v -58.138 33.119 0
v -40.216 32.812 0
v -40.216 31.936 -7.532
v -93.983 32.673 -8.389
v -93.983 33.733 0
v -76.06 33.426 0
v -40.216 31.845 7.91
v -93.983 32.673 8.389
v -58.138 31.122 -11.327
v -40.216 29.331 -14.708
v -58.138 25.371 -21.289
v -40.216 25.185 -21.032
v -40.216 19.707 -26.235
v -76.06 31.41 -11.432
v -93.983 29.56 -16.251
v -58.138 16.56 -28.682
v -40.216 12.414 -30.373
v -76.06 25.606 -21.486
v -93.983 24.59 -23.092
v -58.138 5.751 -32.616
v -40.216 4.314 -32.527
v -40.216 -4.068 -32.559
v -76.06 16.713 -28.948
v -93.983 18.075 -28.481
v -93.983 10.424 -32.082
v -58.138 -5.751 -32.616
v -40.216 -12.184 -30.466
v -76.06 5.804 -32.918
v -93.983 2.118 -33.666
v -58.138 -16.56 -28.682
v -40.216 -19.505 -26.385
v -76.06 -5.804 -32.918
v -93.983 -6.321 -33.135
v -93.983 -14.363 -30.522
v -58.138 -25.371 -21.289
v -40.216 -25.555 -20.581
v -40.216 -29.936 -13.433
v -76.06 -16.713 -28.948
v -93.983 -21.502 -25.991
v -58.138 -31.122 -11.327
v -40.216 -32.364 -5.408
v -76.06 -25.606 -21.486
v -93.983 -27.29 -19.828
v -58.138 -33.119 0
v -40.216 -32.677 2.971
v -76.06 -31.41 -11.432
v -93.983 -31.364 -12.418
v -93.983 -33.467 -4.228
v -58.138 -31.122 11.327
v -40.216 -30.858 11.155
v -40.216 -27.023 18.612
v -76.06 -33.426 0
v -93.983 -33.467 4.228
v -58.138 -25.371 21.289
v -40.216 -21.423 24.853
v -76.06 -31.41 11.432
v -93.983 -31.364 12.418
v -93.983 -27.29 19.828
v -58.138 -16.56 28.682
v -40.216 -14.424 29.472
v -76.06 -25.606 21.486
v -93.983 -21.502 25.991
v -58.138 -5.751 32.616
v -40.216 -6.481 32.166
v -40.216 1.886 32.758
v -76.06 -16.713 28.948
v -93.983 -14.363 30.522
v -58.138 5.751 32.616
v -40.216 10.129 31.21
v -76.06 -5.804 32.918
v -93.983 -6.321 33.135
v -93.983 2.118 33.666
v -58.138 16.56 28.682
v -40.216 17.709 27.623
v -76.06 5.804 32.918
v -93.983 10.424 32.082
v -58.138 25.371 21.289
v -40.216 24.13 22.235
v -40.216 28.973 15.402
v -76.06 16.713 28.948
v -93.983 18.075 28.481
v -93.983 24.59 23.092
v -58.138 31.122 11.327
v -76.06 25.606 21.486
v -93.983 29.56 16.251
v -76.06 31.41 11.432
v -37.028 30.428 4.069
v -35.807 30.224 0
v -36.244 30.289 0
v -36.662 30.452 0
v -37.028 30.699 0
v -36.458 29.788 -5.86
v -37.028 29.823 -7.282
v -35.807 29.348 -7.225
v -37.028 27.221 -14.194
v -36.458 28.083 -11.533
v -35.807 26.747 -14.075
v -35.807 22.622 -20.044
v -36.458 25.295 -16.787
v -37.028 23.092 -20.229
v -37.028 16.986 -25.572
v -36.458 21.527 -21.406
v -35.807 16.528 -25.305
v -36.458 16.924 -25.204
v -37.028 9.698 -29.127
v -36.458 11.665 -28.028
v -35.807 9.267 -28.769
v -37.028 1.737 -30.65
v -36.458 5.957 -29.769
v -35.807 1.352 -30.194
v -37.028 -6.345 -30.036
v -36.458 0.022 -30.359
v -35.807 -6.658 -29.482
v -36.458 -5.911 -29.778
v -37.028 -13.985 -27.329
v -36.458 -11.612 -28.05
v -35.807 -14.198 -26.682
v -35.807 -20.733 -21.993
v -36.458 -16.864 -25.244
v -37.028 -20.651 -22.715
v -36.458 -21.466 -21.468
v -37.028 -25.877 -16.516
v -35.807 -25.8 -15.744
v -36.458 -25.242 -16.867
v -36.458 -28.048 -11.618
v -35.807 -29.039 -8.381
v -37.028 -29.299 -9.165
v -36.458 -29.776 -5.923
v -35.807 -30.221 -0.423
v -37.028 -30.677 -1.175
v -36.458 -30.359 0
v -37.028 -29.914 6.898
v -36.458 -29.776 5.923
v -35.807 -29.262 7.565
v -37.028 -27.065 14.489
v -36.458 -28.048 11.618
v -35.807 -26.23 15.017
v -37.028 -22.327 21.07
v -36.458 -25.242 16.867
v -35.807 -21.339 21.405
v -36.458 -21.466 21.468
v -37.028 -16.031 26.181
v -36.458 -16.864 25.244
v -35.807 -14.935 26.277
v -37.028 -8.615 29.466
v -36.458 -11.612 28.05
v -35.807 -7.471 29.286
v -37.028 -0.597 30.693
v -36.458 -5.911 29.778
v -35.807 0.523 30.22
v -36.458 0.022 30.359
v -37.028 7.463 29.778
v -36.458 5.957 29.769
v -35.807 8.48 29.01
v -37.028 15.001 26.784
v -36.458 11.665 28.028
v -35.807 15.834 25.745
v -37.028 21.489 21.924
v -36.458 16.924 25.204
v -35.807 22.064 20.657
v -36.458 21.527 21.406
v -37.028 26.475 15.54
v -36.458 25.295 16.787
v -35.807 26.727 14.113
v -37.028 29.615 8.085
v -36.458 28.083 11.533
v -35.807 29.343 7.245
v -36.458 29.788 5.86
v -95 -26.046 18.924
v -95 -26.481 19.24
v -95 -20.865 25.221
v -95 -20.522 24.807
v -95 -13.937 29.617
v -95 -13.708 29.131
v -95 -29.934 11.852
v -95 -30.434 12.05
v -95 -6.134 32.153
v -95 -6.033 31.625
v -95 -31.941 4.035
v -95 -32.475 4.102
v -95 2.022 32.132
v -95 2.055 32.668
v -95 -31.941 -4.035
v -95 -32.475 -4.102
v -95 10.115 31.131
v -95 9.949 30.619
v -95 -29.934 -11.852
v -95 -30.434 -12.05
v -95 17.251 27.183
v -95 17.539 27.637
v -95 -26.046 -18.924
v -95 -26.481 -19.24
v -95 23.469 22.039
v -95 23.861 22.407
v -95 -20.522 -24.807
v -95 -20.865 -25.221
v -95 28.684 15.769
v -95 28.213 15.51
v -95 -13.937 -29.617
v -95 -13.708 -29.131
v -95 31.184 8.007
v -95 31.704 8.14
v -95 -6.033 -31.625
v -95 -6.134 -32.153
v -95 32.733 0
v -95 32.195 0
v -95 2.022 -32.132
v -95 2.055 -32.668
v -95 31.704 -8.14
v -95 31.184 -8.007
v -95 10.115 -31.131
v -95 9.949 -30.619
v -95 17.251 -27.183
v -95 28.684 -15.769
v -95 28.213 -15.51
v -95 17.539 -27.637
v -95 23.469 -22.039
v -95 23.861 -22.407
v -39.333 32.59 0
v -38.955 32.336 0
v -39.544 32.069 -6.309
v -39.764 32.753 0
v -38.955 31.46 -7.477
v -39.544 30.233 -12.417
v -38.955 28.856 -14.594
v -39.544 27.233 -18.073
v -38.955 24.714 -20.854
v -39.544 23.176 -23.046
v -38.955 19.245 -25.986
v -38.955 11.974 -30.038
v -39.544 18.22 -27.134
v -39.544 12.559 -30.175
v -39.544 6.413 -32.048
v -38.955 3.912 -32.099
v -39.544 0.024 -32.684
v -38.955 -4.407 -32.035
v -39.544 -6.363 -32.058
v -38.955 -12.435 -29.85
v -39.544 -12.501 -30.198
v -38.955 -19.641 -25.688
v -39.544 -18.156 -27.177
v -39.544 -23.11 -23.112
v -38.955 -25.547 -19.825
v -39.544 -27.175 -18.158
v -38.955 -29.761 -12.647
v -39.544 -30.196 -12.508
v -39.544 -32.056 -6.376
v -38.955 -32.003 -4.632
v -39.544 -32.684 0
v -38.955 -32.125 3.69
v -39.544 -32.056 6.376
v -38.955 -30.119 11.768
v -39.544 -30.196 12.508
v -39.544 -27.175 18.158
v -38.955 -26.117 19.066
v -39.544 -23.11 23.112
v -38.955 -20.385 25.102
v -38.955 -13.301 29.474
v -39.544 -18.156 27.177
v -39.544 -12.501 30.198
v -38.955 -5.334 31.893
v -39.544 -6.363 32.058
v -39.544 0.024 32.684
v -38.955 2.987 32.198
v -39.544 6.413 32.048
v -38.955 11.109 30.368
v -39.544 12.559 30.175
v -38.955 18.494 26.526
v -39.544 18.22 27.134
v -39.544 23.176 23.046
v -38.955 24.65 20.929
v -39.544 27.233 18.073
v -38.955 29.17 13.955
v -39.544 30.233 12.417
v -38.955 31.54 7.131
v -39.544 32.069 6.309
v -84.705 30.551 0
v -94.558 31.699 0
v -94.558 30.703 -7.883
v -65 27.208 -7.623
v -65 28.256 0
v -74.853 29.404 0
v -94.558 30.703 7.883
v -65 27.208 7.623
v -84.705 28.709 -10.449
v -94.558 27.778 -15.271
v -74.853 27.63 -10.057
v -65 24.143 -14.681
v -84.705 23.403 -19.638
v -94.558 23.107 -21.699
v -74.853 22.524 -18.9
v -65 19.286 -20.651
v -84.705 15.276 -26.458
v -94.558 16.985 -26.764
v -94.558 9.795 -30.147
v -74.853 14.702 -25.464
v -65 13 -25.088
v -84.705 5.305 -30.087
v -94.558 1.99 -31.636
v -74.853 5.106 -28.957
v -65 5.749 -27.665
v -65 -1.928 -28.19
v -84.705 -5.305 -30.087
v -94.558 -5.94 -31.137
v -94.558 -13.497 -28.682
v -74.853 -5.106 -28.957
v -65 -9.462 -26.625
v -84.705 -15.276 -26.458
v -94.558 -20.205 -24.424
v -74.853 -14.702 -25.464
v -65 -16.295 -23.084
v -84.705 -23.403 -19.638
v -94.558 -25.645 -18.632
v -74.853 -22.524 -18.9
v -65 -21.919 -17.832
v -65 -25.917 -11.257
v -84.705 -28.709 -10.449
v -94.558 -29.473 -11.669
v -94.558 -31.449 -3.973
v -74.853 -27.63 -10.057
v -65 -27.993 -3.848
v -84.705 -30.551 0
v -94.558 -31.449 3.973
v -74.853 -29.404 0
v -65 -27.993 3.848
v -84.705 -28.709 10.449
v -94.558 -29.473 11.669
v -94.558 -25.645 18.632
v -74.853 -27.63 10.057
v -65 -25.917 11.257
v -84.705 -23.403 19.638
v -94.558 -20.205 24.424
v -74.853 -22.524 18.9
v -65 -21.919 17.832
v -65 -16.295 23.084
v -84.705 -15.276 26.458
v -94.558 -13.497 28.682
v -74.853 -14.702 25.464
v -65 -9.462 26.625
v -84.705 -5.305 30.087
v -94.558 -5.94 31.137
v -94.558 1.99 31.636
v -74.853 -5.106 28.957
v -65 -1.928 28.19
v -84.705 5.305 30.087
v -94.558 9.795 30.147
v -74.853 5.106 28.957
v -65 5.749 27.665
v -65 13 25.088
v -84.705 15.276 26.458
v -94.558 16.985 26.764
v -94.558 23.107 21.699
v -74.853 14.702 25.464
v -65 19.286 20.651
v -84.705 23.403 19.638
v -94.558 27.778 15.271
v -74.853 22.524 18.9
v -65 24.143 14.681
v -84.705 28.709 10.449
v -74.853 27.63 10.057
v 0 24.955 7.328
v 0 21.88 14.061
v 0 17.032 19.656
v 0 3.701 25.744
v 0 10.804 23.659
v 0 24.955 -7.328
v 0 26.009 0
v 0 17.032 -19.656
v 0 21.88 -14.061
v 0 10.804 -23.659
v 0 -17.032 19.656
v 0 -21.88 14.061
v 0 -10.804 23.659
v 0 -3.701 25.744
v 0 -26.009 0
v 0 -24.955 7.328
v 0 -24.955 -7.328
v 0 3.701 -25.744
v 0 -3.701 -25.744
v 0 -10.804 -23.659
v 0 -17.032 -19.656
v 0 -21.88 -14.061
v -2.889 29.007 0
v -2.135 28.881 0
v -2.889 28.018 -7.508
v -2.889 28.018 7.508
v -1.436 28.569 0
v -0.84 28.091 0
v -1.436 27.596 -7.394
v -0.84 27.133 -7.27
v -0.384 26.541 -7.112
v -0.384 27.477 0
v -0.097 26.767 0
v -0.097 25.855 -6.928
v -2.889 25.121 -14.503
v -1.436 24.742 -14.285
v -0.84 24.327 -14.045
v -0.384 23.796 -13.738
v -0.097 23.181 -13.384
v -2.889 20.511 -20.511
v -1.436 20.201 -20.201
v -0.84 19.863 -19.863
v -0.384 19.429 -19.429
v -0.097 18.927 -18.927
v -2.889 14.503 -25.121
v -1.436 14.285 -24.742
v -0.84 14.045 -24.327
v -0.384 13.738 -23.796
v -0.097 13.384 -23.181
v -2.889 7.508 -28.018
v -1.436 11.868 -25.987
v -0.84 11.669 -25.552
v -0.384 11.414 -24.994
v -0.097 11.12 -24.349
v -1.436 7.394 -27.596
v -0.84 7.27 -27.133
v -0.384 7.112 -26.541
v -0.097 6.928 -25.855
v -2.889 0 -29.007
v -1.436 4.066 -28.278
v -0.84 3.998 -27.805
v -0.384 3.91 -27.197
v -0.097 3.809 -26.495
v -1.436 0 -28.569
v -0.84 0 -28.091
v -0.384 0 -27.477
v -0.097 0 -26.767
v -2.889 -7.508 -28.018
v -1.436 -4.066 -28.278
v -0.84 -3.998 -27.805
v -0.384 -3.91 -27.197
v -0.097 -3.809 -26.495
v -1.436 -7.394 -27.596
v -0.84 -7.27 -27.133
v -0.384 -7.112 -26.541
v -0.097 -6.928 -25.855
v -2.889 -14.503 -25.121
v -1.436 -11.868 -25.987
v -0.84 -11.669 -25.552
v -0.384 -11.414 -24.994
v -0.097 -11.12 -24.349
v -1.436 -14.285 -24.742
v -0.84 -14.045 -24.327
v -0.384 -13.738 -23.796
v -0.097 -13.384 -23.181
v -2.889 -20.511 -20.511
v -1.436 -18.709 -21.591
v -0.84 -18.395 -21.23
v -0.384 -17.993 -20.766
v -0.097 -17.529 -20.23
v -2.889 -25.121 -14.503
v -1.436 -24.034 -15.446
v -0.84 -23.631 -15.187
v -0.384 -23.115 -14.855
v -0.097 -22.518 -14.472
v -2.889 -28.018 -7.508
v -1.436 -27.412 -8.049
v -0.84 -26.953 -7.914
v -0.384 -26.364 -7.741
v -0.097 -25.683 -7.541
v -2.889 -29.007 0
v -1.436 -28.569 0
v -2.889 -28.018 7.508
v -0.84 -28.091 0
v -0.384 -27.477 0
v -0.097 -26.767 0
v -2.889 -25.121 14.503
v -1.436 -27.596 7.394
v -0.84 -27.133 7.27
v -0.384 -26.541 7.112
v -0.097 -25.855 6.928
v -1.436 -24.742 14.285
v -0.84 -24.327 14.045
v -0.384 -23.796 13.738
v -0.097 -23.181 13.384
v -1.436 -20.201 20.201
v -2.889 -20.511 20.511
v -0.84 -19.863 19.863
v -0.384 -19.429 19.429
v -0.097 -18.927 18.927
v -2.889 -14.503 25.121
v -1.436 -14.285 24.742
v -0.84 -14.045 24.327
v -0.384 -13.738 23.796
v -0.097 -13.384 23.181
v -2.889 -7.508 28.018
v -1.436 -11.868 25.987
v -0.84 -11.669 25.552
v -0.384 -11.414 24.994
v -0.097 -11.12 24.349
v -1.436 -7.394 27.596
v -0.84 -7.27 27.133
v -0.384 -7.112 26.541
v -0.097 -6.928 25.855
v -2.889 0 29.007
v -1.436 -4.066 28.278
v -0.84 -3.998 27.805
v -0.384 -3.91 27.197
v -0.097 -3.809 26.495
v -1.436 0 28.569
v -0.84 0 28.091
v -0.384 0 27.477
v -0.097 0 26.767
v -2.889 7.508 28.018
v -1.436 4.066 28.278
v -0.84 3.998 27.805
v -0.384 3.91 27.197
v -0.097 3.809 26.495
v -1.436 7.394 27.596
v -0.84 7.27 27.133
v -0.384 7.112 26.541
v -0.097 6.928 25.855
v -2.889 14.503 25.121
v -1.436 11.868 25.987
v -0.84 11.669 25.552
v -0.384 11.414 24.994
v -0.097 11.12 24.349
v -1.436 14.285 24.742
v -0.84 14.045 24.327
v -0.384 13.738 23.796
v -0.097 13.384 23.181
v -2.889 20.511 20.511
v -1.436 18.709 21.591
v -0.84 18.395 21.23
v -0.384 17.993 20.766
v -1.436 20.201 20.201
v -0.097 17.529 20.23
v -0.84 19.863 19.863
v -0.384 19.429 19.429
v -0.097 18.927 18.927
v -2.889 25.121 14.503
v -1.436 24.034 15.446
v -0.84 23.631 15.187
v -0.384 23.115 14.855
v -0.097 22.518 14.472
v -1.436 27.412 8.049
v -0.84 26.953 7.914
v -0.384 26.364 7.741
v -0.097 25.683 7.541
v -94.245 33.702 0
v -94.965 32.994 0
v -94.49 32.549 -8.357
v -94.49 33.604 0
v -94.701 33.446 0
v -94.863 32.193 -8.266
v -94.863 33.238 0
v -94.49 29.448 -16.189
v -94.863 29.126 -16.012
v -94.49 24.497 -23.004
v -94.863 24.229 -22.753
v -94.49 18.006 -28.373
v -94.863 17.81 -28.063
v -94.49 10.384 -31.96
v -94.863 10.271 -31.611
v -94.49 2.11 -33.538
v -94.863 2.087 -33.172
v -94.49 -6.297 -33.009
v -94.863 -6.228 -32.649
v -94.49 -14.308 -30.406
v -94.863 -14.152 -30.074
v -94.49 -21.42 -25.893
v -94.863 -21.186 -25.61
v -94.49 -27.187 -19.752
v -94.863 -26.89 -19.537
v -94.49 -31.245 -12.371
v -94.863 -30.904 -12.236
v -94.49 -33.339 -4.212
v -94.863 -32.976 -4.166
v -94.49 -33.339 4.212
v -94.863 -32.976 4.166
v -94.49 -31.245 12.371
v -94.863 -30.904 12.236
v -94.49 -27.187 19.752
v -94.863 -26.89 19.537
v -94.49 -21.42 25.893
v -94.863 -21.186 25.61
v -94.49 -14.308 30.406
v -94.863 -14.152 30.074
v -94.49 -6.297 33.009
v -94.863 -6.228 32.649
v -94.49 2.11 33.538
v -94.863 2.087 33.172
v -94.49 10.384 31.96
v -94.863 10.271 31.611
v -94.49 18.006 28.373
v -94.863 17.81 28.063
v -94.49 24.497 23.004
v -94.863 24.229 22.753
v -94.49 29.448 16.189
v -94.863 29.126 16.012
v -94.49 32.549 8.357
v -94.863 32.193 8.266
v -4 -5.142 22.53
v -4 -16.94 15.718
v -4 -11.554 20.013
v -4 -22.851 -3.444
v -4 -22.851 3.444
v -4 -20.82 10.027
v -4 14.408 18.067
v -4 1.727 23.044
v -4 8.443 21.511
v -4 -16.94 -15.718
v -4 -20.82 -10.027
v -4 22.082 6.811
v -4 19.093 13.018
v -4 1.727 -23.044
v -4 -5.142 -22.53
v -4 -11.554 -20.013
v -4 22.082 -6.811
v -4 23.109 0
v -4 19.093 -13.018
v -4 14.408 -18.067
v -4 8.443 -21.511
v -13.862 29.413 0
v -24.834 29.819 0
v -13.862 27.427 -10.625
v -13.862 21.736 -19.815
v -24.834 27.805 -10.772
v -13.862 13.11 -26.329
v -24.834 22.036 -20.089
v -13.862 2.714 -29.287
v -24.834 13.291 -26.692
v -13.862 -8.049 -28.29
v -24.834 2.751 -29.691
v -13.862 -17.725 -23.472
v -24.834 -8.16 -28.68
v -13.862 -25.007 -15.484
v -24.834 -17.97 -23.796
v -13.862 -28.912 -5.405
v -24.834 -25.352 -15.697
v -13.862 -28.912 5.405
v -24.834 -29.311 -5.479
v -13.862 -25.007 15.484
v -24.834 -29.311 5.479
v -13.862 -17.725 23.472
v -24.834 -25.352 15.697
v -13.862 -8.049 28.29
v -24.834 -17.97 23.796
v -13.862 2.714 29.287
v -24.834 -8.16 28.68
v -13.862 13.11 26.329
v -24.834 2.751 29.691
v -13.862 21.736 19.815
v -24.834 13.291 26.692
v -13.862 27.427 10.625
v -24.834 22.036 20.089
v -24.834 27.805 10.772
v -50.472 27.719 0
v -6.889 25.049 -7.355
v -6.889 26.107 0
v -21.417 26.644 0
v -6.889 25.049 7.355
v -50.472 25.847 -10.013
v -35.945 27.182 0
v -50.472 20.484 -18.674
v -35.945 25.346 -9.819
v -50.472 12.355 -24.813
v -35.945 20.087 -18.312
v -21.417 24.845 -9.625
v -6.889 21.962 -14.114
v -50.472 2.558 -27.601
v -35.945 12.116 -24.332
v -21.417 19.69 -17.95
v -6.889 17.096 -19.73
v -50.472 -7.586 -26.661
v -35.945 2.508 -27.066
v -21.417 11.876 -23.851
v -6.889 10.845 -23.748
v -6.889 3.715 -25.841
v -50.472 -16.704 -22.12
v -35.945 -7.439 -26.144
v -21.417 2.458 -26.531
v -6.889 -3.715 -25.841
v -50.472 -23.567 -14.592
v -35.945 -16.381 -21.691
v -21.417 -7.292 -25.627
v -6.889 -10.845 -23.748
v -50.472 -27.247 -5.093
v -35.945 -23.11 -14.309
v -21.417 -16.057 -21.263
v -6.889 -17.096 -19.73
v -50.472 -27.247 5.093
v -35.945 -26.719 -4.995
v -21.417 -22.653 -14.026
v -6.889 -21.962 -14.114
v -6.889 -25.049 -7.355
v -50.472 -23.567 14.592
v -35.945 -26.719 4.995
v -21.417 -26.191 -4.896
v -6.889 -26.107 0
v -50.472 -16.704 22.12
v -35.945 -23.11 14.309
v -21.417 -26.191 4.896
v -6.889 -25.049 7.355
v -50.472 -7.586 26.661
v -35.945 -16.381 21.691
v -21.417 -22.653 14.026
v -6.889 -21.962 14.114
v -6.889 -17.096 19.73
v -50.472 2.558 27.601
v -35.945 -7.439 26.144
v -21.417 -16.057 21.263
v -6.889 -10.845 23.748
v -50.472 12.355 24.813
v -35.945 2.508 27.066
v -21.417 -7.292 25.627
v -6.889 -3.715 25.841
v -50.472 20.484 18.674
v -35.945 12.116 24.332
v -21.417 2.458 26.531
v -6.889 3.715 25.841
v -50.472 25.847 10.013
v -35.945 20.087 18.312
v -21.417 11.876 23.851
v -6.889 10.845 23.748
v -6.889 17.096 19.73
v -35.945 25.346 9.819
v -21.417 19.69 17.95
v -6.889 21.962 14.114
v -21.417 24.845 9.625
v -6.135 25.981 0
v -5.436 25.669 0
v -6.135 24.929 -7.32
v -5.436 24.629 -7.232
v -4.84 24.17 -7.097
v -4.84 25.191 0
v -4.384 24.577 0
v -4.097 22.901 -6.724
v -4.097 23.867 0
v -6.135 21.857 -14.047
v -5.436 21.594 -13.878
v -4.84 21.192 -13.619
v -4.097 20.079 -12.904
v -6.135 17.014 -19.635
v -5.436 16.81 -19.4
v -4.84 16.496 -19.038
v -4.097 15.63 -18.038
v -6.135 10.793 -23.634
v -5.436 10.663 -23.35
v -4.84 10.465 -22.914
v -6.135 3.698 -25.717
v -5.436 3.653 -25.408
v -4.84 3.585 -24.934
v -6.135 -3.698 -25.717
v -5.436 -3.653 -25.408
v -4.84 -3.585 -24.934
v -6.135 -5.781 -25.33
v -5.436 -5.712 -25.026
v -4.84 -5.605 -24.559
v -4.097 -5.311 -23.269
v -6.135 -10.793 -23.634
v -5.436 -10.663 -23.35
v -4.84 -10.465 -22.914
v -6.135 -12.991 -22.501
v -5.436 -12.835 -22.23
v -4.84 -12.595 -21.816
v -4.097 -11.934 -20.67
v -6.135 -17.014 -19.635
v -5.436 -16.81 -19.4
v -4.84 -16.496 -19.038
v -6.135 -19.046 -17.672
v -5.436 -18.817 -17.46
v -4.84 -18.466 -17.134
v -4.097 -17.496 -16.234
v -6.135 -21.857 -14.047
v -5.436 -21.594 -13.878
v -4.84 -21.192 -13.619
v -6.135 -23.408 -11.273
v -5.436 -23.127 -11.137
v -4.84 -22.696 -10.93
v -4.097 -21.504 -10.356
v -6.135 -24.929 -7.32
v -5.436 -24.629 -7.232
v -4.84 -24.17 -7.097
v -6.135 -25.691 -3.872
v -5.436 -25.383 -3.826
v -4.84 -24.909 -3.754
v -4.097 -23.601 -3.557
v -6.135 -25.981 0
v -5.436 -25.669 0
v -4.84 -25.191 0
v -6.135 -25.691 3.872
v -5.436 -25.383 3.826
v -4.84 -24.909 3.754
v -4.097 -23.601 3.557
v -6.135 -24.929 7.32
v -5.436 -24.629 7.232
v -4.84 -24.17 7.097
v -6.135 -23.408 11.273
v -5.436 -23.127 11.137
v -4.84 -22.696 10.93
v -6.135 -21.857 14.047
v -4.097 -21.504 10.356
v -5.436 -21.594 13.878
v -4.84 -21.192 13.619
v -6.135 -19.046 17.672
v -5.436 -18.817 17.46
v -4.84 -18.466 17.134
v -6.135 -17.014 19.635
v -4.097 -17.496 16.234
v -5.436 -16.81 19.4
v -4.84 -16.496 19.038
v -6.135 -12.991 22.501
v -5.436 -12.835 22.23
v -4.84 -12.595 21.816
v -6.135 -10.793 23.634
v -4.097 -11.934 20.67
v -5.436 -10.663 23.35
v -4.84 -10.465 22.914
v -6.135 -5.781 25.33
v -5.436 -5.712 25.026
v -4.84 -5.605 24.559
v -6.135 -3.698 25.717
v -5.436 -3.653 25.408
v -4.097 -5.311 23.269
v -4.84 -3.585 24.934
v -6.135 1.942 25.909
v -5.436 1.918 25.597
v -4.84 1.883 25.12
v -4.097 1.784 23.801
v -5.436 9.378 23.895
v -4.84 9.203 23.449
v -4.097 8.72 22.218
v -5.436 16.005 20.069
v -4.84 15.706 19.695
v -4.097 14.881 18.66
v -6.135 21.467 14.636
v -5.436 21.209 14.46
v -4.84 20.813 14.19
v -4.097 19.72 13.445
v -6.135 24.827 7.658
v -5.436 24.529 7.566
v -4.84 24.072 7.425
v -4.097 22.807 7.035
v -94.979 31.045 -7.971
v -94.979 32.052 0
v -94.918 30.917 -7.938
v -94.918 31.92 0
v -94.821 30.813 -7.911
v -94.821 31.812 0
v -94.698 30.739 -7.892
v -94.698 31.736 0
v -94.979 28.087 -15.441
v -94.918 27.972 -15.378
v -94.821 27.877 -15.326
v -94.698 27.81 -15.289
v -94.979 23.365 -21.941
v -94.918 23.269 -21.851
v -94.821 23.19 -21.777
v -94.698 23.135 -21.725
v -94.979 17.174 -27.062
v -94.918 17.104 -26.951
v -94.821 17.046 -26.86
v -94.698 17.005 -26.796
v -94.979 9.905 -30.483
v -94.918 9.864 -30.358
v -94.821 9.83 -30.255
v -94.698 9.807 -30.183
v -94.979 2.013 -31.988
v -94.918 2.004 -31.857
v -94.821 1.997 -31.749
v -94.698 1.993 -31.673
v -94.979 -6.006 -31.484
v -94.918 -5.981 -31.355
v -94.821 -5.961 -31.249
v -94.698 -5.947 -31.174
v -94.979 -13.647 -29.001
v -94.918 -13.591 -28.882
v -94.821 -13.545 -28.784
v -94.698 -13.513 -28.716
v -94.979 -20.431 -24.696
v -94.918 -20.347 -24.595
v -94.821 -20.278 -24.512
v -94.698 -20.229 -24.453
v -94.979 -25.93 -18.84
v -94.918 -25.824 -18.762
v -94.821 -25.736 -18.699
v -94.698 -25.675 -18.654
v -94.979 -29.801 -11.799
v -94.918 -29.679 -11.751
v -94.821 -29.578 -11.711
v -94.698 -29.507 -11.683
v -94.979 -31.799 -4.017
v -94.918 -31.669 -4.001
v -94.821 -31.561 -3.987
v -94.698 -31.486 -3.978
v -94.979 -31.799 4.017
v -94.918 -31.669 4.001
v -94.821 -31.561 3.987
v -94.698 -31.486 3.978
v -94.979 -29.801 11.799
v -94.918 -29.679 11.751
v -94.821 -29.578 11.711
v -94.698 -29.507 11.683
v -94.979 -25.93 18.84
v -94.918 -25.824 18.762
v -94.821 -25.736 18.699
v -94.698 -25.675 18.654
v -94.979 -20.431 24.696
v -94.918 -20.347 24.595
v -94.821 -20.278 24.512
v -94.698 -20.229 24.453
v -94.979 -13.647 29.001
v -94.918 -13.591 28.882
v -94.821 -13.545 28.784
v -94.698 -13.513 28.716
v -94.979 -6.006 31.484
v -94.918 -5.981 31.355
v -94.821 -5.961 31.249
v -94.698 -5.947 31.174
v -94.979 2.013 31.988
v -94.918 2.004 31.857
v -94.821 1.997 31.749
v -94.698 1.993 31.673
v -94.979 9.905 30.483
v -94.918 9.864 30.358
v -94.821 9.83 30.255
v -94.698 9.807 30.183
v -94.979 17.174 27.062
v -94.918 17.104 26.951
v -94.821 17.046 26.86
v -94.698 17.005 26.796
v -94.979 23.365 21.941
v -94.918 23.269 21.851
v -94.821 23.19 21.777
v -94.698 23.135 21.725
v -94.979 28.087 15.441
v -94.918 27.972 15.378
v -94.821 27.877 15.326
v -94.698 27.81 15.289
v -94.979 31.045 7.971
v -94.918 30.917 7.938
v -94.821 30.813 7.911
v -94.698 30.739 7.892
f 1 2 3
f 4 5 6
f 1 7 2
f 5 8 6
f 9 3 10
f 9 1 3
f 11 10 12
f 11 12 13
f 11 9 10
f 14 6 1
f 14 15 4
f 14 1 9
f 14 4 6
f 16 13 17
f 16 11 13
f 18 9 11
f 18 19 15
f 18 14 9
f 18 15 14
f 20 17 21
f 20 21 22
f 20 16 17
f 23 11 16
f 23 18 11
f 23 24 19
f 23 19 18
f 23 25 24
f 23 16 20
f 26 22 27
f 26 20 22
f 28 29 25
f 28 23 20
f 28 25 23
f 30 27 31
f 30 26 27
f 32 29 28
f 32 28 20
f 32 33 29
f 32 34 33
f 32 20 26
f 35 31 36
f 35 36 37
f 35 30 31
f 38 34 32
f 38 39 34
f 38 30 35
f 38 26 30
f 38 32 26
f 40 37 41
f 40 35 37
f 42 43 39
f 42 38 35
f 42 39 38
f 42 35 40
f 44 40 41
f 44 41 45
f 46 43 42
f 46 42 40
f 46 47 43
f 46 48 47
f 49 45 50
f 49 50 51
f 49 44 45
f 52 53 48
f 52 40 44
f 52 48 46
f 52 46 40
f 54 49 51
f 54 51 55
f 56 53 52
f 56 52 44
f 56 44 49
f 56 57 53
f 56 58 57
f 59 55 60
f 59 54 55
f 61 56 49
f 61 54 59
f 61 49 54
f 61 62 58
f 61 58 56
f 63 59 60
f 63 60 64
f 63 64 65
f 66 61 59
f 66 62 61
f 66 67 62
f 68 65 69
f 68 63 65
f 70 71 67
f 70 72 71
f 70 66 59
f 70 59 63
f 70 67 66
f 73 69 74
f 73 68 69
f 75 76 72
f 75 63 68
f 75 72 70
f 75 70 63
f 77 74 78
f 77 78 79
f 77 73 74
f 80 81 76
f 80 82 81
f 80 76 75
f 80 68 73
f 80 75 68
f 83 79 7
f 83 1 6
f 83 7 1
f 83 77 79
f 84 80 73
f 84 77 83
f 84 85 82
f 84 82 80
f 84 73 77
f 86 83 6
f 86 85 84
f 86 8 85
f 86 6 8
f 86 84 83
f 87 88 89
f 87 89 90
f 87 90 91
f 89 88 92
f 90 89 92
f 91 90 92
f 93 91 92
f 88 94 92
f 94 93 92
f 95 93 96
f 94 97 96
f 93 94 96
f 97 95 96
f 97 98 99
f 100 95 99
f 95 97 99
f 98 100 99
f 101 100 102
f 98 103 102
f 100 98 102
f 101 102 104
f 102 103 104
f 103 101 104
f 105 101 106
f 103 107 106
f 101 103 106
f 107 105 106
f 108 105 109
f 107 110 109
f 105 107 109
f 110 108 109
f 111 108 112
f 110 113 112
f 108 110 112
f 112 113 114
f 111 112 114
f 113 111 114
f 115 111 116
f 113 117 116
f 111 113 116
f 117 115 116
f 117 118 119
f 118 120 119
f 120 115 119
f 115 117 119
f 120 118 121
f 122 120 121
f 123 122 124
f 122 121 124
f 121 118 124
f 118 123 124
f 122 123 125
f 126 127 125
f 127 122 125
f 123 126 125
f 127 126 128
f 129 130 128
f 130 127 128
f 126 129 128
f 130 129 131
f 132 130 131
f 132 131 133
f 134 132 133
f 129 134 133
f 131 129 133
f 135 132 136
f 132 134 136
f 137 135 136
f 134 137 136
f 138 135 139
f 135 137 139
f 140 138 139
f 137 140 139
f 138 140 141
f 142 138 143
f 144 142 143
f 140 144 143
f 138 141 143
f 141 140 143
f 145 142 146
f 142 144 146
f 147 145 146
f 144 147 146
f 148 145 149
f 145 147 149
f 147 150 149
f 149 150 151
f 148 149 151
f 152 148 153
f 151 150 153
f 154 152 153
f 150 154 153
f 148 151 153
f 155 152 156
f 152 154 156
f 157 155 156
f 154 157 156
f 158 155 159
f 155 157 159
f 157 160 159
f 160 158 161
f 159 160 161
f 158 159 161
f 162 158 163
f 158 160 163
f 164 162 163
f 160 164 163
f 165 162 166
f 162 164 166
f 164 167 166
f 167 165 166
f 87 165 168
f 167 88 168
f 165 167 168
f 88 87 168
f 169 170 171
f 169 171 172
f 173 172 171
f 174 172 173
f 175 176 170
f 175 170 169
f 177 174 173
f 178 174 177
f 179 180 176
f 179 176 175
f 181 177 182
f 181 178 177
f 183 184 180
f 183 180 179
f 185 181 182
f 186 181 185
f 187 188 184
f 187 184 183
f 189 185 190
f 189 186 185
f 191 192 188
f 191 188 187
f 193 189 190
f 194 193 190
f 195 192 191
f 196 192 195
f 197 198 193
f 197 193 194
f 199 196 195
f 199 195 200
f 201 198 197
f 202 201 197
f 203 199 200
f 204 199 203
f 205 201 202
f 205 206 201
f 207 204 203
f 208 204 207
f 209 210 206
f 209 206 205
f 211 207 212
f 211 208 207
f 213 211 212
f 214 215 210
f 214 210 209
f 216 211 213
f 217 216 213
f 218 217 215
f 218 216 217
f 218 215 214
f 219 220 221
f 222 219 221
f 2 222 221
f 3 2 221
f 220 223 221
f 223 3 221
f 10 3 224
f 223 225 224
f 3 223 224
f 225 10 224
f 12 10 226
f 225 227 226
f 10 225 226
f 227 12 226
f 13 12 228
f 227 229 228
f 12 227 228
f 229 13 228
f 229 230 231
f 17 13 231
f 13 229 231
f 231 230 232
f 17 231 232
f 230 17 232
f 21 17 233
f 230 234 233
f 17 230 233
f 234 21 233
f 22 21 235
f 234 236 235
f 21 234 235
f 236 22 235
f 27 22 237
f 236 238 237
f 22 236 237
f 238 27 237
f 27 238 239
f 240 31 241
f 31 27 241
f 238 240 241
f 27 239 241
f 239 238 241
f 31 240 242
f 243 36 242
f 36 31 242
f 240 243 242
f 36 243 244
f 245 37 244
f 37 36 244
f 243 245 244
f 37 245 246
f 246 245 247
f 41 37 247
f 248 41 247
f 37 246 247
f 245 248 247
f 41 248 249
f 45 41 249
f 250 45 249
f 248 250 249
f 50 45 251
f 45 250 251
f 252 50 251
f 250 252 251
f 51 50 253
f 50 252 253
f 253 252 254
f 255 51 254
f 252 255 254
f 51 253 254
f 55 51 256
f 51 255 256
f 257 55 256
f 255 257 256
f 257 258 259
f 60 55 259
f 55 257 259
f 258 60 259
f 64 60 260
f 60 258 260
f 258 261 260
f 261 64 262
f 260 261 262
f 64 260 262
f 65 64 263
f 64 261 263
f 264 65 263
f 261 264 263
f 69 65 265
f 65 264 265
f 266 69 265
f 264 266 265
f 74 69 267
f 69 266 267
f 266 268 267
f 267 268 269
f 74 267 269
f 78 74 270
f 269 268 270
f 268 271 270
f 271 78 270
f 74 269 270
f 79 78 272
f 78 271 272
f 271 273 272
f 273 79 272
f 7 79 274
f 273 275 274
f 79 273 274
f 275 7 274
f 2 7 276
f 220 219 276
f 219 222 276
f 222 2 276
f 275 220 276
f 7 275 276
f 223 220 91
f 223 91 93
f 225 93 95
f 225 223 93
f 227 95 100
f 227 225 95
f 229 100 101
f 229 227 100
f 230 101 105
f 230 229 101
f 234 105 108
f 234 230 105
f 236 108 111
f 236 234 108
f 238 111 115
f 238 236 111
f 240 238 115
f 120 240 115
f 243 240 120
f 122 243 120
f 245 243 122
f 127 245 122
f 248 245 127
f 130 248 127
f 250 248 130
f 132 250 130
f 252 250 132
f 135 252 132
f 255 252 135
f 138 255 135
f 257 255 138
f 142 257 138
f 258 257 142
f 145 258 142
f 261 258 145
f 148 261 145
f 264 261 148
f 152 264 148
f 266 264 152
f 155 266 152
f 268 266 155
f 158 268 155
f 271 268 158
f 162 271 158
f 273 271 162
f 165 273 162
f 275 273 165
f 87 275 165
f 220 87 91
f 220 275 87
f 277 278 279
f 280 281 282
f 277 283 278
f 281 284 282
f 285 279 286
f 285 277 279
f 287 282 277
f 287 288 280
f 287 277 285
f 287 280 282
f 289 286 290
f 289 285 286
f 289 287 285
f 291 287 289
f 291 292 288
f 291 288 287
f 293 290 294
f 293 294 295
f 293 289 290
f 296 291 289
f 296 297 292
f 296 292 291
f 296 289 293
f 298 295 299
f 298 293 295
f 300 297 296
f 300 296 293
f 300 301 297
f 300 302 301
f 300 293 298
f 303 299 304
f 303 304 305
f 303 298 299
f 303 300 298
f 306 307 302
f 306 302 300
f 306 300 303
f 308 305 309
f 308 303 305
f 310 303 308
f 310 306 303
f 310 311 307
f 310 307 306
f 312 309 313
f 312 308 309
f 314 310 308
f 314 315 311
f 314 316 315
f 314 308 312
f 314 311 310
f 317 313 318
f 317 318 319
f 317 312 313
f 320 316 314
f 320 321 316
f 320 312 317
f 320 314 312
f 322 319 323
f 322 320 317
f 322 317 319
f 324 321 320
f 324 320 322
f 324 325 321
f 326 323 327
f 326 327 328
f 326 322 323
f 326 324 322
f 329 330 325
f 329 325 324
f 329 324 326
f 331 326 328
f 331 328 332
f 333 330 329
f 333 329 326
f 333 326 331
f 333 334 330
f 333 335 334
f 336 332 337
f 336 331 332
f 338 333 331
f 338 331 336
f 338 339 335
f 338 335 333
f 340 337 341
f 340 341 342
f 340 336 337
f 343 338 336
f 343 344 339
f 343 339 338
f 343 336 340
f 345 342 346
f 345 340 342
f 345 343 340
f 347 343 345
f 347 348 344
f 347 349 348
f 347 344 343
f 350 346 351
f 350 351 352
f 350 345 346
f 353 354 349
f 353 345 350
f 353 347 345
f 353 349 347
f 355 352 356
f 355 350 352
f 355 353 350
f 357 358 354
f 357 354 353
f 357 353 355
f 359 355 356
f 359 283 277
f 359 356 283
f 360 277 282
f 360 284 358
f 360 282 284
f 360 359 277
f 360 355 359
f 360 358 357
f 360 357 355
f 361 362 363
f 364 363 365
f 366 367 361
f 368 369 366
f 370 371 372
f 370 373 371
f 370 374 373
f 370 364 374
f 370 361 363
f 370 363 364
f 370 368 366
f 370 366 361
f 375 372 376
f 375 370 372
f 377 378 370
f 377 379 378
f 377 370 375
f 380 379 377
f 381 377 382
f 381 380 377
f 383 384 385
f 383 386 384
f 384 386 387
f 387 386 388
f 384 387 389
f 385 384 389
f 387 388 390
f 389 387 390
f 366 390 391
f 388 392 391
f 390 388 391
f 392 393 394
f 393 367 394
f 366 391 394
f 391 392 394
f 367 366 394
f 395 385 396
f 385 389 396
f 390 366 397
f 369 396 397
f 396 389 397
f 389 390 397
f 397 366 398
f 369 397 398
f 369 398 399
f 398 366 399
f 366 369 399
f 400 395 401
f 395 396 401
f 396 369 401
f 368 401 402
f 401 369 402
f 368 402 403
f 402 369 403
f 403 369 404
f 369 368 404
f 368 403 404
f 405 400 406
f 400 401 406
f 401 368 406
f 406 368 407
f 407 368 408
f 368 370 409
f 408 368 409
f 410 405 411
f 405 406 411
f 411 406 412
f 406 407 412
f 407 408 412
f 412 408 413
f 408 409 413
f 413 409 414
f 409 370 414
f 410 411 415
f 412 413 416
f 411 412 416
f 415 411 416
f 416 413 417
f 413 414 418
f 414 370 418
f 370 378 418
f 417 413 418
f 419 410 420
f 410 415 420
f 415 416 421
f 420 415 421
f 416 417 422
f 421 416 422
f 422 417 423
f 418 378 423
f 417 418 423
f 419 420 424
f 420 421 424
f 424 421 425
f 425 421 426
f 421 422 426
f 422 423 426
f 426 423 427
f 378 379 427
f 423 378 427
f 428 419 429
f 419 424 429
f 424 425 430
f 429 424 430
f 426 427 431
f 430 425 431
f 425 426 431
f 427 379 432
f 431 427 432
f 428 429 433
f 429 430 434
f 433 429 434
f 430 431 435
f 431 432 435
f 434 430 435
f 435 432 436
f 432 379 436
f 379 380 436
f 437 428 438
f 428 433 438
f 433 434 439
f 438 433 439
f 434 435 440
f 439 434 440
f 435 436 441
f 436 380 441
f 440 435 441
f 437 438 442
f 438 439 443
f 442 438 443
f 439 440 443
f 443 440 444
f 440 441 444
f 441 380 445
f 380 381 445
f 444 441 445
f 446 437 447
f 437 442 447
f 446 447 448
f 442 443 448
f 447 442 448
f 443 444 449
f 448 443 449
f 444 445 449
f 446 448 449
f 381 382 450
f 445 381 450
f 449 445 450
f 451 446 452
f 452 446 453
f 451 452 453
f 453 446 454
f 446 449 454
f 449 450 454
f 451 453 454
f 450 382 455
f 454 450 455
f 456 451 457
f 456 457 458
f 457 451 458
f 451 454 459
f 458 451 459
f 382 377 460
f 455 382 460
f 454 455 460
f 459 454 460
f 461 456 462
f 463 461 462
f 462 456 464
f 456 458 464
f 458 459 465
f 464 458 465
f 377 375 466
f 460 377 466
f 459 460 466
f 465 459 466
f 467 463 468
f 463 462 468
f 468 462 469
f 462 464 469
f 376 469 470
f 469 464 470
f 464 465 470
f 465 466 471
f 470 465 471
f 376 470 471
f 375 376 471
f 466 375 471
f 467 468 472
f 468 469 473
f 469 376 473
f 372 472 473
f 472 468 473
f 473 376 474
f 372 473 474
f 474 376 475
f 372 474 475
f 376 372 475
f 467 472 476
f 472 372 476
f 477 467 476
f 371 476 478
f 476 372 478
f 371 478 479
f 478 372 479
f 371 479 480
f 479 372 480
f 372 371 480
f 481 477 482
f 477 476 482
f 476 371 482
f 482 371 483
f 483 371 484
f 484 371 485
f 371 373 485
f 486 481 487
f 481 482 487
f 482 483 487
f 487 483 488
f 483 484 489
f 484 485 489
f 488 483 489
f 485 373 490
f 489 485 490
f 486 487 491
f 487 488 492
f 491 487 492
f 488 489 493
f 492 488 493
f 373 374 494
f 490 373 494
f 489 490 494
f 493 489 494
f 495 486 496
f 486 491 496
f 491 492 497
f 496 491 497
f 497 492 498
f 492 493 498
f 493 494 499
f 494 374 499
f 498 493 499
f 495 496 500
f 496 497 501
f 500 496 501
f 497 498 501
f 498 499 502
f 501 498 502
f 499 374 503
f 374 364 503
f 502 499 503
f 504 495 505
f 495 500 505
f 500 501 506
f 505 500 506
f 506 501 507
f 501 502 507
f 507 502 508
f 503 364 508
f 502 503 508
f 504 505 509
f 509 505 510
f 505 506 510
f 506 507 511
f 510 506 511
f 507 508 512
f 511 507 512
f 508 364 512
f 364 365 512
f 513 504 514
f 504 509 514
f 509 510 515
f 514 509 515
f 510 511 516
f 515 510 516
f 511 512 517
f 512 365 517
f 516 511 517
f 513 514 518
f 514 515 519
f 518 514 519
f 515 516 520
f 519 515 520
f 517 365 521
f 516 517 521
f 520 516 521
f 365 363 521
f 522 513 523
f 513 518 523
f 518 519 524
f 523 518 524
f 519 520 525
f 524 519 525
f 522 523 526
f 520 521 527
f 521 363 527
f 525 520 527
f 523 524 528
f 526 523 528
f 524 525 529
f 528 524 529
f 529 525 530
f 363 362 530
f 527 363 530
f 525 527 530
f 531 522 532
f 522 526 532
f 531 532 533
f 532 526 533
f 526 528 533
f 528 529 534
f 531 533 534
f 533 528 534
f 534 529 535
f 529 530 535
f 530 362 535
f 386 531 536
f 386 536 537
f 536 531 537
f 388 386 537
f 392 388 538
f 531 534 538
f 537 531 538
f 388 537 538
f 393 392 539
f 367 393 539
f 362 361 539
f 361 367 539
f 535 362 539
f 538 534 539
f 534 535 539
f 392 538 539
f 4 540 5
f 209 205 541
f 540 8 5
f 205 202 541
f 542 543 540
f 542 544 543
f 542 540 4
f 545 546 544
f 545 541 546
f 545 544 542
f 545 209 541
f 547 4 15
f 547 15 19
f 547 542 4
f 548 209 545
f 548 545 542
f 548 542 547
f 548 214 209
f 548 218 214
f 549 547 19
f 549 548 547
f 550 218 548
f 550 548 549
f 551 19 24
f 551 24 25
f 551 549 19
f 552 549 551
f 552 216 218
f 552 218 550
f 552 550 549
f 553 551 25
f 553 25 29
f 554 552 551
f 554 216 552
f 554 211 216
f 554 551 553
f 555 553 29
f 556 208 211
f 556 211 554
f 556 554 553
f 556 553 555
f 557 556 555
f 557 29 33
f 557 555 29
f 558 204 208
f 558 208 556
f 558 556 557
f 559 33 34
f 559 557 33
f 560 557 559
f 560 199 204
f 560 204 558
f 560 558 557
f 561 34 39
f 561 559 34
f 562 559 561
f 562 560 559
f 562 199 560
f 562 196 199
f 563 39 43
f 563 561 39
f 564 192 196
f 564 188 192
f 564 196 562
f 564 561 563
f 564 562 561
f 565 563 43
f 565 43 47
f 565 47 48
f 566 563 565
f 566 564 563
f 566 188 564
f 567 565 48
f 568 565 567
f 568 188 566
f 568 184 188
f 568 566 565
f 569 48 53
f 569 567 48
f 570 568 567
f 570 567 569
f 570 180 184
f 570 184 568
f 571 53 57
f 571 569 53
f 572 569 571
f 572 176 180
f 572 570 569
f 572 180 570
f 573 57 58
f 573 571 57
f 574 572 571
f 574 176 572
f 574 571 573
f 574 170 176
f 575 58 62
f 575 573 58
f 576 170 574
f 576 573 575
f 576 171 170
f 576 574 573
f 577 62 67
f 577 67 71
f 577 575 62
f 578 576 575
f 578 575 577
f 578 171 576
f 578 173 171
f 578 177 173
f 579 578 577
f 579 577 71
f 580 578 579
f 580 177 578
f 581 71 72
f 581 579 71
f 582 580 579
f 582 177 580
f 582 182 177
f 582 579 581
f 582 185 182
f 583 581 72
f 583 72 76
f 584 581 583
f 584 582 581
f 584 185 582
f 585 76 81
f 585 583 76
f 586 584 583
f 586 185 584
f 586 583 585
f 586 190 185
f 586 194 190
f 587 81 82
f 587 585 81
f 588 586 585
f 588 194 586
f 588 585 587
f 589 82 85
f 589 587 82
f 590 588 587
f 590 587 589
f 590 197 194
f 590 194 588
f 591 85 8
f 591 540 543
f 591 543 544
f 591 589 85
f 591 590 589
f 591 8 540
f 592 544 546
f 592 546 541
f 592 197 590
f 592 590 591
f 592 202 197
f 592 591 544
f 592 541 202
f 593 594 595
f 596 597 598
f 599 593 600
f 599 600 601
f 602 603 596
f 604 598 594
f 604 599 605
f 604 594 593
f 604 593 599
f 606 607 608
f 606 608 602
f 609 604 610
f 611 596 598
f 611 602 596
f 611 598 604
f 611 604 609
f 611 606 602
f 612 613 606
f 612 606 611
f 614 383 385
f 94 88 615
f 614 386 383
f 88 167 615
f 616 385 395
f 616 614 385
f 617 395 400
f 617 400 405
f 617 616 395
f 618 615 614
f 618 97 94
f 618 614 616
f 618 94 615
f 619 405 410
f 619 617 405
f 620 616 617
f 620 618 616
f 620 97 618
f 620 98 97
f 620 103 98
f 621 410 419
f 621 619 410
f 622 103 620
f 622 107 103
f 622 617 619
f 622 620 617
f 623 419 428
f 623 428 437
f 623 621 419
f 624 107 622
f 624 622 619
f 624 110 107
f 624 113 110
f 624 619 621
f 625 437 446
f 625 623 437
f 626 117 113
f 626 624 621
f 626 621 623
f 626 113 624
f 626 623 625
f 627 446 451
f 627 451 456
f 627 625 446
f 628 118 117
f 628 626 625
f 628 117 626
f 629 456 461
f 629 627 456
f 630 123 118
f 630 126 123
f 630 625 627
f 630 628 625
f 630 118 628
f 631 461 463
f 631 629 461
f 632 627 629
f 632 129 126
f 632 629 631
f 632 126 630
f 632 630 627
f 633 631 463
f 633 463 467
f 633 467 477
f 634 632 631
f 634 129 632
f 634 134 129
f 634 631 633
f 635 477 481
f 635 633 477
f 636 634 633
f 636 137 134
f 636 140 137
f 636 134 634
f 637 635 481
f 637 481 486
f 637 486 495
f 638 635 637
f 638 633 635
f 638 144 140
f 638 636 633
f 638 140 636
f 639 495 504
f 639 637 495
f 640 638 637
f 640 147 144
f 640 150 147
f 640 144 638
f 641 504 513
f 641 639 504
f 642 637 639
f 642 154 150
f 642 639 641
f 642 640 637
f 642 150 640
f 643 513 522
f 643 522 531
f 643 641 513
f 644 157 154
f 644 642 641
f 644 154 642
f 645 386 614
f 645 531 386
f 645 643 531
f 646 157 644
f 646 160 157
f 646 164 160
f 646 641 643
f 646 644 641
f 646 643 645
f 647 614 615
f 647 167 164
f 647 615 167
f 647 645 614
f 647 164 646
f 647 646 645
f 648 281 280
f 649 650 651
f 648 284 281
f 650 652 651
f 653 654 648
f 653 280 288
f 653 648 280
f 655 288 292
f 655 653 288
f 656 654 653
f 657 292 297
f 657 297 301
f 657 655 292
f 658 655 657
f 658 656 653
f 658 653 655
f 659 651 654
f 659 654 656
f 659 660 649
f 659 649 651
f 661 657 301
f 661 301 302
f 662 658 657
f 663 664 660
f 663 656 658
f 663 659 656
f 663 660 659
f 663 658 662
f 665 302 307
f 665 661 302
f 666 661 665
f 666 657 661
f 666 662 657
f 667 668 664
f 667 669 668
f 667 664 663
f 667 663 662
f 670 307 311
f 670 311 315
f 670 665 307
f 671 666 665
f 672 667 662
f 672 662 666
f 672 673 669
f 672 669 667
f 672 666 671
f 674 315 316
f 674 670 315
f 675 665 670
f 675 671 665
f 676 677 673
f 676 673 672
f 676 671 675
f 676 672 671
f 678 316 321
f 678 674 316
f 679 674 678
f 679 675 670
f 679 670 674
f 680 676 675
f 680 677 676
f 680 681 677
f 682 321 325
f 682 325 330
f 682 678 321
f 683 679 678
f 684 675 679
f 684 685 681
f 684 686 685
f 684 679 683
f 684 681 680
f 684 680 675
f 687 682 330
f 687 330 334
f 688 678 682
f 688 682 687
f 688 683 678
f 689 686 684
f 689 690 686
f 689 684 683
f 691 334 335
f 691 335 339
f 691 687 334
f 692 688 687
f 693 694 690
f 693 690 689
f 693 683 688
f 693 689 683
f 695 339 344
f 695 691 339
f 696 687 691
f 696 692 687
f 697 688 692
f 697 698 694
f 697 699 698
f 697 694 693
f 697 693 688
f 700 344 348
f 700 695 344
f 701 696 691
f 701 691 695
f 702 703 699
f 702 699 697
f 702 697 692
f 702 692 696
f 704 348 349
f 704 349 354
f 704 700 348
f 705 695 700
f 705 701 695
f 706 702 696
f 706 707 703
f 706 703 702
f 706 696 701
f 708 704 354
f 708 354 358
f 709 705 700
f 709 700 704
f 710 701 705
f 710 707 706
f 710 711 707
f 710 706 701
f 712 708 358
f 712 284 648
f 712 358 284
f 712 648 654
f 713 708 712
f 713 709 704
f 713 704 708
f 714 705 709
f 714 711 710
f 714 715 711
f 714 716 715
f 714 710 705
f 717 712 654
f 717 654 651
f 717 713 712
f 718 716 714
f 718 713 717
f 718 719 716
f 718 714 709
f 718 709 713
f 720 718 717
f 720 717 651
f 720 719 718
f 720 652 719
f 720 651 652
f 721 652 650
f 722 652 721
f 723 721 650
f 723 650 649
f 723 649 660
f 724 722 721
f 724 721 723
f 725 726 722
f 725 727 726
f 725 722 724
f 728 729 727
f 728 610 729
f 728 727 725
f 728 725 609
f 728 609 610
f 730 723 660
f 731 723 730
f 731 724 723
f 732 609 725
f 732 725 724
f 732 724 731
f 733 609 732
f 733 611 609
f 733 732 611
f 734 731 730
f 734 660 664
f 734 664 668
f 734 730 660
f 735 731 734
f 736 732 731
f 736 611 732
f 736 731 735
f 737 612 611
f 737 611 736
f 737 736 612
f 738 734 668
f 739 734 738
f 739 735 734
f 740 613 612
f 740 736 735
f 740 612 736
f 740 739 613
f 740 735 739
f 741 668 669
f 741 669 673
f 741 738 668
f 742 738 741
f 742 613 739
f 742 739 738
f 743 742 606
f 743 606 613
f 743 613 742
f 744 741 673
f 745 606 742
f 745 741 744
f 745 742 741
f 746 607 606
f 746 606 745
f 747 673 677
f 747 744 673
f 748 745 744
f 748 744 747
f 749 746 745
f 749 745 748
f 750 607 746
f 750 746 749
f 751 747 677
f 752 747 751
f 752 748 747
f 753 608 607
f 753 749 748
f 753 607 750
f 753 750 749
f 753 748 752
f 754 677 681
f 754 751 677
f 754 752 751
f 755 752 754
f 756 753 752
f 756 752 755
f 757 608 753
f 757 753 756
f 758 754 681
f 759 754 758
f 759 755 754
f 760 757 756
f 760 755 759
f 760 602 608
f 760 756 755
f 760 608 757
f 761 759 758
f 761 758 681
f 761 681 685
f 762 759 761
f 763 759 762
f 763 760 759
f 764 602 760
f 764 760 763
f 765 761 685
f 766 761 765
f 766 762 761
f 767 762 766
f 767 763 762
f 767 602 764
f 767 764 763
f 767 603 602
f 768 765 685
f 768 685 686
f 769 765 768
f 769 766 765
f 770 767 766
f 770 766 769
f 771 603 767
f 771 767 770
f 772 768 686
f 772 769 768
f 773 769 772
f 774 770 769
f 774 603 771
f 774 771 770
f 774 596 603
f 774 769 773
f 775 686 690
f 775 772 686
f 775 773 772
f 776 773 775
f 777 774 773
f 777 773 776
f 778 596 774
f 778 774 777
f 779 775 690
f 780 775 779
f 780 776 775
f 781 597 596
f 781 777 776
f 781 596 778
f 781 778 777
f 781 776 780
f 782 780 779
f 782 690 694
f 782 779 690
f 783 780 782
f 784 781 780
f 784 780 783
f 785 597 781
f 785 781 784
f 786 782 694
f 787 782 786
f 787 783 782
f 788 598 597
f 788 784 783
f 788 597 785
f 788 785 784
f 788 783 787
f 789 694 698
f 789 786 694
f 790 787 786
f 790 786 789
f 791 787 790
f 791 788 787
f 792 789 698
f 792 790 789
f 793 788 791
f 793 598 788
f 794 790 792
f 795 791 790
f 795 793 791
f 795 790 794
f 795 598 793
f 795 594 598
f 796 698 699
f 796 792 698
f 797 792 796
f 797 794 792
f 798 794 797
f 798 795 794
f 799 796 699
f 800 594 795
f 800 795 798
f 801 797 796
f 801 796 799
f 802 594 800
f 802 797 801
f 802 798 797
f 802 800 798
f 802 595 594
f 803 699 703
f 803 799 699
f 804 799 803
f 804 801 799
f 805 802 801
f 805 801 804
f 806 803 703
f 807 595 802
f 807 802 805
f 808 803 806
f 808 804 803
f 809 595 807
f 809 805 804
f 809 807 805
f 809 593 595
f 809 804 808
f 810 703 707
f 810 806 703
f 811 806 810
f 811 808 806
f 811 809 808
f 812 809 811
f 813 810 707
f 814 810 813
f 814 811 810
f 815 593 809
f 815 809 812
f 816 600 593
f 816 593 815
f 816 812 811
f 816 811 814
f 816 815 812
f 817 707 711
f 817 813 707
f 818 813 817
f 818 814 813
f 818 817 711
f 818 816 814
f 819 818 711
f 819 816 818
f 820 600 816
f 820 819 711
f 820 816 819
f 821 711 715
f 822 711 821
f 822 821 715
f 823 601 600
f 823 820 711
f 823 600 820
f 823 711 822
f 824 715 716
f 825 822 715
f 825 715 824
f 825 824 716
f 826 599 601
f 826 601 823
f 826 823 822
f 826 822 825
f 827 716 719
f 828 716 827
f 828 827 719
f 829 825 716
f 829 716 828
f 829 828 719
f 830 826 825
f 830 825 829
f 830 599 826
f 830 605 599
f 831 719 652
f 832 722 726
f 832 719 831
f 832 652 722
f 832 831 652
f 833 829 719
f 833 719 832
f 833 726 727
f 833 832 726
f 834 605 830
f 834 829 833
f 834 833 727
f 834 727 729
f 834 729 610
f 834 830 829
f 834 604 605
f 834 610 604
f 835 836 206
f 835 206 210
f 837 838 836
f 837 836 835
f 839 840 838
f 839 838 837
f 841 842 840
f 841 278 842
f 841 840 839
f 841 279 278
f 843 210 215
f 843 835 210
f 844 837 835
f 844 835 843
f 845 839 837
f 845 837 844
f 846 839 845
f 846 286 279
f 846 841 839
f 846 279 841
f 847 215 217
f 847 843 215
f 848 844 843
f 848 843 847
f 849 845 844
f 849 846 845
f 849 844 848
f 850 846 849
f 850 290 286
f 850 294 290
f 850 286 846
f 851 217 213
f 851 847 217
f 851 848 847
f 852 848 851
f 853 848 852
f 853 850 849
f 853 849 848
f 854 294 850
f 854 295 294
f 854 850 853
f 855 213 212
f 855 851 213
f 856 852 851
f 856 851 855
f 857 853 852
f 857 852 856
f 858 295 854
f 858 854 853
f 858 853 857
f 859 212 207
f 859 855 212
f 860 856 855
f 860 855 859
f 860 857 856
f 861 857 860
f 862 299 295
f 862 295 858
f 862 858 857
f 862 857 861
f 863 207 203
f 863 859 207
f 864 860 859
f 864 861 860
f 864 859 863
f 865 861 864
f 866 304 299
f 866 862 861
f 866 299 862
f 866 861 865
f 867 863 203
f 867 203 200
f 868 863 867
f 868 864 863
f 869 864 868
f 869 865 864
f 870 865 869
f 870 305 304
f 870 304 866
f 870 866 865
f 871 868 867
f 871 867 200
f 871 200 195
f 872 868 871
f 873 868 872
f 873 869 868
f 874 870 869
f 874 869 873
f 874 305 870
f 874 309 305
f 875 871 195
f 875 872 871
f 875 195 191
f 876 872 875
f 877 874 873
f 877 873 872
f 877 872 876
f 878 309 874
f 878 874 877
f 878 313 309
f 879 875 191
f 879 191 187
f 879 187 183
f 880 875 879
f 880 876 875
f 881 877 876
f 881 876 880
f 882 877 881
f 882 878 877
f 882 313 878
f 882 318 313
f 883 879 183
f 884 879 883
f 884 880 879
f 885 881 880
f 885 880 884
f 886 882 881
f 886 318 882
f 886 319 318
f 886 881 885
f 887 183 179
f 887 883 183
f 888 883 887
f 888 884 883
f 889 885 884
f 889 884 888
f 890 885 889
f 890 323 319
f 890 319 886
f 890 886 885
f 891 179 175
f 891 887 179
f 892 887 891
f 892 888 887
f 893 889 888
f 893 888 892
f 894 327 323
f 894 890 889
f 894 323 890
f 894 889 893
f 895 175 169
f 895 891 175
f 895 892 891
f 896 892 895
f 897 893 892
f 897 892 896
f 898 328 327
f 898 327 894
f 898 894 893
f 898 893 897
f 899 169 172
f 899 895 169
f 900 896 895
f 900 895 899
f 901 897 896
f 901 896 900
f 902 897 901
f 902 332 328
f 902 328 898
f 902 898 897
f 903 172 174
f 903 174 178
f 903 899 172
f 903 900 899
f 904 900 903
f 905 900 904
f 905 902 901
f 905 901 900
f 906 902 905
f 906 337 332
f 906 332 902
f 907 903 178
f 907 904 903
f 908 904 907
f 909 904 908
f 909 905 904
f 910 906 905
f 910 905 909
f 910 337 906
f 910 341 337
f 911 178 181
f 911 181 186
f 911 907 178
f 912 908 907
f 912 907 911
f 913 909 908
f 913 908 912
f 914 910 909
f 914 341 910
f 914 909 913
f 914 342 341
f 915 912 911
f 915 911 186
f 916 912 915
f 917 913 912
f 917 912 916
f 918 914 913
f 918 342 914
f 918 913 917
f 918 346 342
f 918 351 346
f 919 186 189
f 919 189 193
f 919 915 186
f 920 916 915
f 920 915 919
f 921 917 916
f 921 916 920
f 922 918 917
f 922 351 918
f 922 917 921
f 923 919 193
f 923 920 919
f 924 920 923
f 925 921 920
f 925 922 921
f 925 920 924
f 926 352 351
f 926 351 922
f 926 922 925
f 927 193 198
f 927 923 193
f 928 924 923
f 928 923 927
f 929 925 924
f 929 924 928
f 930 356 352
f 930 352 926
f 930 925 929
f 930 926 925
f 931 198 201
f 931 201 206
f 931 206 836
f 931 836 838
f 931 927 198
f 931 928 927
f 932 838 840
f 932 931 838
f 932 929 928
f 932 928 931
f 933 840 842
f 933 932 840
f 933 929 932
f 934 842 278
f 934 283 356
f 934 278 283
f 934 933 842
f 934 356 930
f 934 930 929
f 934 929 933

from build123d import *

# Parameters (mm, degrees)
F2_R = 1
F3_R = 0.5
F4_R = 3
F5_R = 2
F6_R = 3


with BuildPart() as f1:
    # F0 (on Top) → F1 (revolve)
    with BuildSketch(Plane.XY):
        Polygon((-4, 0), (0, 0), (0, 28.9), (-36.5, 30.25), (-39.5, 32.8), (-95, 33.75), (-95, 31.75), (-65, 28.256164), (-4, 26), align=None)
    revolve(axis=Axis((-75.031272, 0, 0), (-1, 0, 0)))

    # F2
    f2_edges = [f1.edges().sort_by_distance(p)[0] for p in [
        (-95, -33.75, 0),
    ]]
    fillet(f2_edges, radius=F2_R)

    # F3
    f3_edges = [f1.edges().sort_by_distance(p)[0] for p in [
        (-95, -31.75, 0),
    ]]
    fillet(f3_edges, radius=F3_R)

    # F4
    f4_edges = [f1.edges().sort_by_distance(p)[0] for p in [
        (0, -28.9, 0),
    ]]
    fillet(f4_edges, radius=F4_R)

    # F5
    f5_edges = [f1.edges().sort_by_distance(p)[0] for p in [
        (-36.5, -30.25, 0),
        (-39.5, -32.8, 0),
    ]]
    fillet(f5_edges, radius=F5_R)

    # F6
    f6_edges = [f1.edges().sort_by_distance(p)[0] for p in [
        (-4, -26, 0),
    ]]
    fillet(f6_edges, radius=F6_R)


solid = f1.part
